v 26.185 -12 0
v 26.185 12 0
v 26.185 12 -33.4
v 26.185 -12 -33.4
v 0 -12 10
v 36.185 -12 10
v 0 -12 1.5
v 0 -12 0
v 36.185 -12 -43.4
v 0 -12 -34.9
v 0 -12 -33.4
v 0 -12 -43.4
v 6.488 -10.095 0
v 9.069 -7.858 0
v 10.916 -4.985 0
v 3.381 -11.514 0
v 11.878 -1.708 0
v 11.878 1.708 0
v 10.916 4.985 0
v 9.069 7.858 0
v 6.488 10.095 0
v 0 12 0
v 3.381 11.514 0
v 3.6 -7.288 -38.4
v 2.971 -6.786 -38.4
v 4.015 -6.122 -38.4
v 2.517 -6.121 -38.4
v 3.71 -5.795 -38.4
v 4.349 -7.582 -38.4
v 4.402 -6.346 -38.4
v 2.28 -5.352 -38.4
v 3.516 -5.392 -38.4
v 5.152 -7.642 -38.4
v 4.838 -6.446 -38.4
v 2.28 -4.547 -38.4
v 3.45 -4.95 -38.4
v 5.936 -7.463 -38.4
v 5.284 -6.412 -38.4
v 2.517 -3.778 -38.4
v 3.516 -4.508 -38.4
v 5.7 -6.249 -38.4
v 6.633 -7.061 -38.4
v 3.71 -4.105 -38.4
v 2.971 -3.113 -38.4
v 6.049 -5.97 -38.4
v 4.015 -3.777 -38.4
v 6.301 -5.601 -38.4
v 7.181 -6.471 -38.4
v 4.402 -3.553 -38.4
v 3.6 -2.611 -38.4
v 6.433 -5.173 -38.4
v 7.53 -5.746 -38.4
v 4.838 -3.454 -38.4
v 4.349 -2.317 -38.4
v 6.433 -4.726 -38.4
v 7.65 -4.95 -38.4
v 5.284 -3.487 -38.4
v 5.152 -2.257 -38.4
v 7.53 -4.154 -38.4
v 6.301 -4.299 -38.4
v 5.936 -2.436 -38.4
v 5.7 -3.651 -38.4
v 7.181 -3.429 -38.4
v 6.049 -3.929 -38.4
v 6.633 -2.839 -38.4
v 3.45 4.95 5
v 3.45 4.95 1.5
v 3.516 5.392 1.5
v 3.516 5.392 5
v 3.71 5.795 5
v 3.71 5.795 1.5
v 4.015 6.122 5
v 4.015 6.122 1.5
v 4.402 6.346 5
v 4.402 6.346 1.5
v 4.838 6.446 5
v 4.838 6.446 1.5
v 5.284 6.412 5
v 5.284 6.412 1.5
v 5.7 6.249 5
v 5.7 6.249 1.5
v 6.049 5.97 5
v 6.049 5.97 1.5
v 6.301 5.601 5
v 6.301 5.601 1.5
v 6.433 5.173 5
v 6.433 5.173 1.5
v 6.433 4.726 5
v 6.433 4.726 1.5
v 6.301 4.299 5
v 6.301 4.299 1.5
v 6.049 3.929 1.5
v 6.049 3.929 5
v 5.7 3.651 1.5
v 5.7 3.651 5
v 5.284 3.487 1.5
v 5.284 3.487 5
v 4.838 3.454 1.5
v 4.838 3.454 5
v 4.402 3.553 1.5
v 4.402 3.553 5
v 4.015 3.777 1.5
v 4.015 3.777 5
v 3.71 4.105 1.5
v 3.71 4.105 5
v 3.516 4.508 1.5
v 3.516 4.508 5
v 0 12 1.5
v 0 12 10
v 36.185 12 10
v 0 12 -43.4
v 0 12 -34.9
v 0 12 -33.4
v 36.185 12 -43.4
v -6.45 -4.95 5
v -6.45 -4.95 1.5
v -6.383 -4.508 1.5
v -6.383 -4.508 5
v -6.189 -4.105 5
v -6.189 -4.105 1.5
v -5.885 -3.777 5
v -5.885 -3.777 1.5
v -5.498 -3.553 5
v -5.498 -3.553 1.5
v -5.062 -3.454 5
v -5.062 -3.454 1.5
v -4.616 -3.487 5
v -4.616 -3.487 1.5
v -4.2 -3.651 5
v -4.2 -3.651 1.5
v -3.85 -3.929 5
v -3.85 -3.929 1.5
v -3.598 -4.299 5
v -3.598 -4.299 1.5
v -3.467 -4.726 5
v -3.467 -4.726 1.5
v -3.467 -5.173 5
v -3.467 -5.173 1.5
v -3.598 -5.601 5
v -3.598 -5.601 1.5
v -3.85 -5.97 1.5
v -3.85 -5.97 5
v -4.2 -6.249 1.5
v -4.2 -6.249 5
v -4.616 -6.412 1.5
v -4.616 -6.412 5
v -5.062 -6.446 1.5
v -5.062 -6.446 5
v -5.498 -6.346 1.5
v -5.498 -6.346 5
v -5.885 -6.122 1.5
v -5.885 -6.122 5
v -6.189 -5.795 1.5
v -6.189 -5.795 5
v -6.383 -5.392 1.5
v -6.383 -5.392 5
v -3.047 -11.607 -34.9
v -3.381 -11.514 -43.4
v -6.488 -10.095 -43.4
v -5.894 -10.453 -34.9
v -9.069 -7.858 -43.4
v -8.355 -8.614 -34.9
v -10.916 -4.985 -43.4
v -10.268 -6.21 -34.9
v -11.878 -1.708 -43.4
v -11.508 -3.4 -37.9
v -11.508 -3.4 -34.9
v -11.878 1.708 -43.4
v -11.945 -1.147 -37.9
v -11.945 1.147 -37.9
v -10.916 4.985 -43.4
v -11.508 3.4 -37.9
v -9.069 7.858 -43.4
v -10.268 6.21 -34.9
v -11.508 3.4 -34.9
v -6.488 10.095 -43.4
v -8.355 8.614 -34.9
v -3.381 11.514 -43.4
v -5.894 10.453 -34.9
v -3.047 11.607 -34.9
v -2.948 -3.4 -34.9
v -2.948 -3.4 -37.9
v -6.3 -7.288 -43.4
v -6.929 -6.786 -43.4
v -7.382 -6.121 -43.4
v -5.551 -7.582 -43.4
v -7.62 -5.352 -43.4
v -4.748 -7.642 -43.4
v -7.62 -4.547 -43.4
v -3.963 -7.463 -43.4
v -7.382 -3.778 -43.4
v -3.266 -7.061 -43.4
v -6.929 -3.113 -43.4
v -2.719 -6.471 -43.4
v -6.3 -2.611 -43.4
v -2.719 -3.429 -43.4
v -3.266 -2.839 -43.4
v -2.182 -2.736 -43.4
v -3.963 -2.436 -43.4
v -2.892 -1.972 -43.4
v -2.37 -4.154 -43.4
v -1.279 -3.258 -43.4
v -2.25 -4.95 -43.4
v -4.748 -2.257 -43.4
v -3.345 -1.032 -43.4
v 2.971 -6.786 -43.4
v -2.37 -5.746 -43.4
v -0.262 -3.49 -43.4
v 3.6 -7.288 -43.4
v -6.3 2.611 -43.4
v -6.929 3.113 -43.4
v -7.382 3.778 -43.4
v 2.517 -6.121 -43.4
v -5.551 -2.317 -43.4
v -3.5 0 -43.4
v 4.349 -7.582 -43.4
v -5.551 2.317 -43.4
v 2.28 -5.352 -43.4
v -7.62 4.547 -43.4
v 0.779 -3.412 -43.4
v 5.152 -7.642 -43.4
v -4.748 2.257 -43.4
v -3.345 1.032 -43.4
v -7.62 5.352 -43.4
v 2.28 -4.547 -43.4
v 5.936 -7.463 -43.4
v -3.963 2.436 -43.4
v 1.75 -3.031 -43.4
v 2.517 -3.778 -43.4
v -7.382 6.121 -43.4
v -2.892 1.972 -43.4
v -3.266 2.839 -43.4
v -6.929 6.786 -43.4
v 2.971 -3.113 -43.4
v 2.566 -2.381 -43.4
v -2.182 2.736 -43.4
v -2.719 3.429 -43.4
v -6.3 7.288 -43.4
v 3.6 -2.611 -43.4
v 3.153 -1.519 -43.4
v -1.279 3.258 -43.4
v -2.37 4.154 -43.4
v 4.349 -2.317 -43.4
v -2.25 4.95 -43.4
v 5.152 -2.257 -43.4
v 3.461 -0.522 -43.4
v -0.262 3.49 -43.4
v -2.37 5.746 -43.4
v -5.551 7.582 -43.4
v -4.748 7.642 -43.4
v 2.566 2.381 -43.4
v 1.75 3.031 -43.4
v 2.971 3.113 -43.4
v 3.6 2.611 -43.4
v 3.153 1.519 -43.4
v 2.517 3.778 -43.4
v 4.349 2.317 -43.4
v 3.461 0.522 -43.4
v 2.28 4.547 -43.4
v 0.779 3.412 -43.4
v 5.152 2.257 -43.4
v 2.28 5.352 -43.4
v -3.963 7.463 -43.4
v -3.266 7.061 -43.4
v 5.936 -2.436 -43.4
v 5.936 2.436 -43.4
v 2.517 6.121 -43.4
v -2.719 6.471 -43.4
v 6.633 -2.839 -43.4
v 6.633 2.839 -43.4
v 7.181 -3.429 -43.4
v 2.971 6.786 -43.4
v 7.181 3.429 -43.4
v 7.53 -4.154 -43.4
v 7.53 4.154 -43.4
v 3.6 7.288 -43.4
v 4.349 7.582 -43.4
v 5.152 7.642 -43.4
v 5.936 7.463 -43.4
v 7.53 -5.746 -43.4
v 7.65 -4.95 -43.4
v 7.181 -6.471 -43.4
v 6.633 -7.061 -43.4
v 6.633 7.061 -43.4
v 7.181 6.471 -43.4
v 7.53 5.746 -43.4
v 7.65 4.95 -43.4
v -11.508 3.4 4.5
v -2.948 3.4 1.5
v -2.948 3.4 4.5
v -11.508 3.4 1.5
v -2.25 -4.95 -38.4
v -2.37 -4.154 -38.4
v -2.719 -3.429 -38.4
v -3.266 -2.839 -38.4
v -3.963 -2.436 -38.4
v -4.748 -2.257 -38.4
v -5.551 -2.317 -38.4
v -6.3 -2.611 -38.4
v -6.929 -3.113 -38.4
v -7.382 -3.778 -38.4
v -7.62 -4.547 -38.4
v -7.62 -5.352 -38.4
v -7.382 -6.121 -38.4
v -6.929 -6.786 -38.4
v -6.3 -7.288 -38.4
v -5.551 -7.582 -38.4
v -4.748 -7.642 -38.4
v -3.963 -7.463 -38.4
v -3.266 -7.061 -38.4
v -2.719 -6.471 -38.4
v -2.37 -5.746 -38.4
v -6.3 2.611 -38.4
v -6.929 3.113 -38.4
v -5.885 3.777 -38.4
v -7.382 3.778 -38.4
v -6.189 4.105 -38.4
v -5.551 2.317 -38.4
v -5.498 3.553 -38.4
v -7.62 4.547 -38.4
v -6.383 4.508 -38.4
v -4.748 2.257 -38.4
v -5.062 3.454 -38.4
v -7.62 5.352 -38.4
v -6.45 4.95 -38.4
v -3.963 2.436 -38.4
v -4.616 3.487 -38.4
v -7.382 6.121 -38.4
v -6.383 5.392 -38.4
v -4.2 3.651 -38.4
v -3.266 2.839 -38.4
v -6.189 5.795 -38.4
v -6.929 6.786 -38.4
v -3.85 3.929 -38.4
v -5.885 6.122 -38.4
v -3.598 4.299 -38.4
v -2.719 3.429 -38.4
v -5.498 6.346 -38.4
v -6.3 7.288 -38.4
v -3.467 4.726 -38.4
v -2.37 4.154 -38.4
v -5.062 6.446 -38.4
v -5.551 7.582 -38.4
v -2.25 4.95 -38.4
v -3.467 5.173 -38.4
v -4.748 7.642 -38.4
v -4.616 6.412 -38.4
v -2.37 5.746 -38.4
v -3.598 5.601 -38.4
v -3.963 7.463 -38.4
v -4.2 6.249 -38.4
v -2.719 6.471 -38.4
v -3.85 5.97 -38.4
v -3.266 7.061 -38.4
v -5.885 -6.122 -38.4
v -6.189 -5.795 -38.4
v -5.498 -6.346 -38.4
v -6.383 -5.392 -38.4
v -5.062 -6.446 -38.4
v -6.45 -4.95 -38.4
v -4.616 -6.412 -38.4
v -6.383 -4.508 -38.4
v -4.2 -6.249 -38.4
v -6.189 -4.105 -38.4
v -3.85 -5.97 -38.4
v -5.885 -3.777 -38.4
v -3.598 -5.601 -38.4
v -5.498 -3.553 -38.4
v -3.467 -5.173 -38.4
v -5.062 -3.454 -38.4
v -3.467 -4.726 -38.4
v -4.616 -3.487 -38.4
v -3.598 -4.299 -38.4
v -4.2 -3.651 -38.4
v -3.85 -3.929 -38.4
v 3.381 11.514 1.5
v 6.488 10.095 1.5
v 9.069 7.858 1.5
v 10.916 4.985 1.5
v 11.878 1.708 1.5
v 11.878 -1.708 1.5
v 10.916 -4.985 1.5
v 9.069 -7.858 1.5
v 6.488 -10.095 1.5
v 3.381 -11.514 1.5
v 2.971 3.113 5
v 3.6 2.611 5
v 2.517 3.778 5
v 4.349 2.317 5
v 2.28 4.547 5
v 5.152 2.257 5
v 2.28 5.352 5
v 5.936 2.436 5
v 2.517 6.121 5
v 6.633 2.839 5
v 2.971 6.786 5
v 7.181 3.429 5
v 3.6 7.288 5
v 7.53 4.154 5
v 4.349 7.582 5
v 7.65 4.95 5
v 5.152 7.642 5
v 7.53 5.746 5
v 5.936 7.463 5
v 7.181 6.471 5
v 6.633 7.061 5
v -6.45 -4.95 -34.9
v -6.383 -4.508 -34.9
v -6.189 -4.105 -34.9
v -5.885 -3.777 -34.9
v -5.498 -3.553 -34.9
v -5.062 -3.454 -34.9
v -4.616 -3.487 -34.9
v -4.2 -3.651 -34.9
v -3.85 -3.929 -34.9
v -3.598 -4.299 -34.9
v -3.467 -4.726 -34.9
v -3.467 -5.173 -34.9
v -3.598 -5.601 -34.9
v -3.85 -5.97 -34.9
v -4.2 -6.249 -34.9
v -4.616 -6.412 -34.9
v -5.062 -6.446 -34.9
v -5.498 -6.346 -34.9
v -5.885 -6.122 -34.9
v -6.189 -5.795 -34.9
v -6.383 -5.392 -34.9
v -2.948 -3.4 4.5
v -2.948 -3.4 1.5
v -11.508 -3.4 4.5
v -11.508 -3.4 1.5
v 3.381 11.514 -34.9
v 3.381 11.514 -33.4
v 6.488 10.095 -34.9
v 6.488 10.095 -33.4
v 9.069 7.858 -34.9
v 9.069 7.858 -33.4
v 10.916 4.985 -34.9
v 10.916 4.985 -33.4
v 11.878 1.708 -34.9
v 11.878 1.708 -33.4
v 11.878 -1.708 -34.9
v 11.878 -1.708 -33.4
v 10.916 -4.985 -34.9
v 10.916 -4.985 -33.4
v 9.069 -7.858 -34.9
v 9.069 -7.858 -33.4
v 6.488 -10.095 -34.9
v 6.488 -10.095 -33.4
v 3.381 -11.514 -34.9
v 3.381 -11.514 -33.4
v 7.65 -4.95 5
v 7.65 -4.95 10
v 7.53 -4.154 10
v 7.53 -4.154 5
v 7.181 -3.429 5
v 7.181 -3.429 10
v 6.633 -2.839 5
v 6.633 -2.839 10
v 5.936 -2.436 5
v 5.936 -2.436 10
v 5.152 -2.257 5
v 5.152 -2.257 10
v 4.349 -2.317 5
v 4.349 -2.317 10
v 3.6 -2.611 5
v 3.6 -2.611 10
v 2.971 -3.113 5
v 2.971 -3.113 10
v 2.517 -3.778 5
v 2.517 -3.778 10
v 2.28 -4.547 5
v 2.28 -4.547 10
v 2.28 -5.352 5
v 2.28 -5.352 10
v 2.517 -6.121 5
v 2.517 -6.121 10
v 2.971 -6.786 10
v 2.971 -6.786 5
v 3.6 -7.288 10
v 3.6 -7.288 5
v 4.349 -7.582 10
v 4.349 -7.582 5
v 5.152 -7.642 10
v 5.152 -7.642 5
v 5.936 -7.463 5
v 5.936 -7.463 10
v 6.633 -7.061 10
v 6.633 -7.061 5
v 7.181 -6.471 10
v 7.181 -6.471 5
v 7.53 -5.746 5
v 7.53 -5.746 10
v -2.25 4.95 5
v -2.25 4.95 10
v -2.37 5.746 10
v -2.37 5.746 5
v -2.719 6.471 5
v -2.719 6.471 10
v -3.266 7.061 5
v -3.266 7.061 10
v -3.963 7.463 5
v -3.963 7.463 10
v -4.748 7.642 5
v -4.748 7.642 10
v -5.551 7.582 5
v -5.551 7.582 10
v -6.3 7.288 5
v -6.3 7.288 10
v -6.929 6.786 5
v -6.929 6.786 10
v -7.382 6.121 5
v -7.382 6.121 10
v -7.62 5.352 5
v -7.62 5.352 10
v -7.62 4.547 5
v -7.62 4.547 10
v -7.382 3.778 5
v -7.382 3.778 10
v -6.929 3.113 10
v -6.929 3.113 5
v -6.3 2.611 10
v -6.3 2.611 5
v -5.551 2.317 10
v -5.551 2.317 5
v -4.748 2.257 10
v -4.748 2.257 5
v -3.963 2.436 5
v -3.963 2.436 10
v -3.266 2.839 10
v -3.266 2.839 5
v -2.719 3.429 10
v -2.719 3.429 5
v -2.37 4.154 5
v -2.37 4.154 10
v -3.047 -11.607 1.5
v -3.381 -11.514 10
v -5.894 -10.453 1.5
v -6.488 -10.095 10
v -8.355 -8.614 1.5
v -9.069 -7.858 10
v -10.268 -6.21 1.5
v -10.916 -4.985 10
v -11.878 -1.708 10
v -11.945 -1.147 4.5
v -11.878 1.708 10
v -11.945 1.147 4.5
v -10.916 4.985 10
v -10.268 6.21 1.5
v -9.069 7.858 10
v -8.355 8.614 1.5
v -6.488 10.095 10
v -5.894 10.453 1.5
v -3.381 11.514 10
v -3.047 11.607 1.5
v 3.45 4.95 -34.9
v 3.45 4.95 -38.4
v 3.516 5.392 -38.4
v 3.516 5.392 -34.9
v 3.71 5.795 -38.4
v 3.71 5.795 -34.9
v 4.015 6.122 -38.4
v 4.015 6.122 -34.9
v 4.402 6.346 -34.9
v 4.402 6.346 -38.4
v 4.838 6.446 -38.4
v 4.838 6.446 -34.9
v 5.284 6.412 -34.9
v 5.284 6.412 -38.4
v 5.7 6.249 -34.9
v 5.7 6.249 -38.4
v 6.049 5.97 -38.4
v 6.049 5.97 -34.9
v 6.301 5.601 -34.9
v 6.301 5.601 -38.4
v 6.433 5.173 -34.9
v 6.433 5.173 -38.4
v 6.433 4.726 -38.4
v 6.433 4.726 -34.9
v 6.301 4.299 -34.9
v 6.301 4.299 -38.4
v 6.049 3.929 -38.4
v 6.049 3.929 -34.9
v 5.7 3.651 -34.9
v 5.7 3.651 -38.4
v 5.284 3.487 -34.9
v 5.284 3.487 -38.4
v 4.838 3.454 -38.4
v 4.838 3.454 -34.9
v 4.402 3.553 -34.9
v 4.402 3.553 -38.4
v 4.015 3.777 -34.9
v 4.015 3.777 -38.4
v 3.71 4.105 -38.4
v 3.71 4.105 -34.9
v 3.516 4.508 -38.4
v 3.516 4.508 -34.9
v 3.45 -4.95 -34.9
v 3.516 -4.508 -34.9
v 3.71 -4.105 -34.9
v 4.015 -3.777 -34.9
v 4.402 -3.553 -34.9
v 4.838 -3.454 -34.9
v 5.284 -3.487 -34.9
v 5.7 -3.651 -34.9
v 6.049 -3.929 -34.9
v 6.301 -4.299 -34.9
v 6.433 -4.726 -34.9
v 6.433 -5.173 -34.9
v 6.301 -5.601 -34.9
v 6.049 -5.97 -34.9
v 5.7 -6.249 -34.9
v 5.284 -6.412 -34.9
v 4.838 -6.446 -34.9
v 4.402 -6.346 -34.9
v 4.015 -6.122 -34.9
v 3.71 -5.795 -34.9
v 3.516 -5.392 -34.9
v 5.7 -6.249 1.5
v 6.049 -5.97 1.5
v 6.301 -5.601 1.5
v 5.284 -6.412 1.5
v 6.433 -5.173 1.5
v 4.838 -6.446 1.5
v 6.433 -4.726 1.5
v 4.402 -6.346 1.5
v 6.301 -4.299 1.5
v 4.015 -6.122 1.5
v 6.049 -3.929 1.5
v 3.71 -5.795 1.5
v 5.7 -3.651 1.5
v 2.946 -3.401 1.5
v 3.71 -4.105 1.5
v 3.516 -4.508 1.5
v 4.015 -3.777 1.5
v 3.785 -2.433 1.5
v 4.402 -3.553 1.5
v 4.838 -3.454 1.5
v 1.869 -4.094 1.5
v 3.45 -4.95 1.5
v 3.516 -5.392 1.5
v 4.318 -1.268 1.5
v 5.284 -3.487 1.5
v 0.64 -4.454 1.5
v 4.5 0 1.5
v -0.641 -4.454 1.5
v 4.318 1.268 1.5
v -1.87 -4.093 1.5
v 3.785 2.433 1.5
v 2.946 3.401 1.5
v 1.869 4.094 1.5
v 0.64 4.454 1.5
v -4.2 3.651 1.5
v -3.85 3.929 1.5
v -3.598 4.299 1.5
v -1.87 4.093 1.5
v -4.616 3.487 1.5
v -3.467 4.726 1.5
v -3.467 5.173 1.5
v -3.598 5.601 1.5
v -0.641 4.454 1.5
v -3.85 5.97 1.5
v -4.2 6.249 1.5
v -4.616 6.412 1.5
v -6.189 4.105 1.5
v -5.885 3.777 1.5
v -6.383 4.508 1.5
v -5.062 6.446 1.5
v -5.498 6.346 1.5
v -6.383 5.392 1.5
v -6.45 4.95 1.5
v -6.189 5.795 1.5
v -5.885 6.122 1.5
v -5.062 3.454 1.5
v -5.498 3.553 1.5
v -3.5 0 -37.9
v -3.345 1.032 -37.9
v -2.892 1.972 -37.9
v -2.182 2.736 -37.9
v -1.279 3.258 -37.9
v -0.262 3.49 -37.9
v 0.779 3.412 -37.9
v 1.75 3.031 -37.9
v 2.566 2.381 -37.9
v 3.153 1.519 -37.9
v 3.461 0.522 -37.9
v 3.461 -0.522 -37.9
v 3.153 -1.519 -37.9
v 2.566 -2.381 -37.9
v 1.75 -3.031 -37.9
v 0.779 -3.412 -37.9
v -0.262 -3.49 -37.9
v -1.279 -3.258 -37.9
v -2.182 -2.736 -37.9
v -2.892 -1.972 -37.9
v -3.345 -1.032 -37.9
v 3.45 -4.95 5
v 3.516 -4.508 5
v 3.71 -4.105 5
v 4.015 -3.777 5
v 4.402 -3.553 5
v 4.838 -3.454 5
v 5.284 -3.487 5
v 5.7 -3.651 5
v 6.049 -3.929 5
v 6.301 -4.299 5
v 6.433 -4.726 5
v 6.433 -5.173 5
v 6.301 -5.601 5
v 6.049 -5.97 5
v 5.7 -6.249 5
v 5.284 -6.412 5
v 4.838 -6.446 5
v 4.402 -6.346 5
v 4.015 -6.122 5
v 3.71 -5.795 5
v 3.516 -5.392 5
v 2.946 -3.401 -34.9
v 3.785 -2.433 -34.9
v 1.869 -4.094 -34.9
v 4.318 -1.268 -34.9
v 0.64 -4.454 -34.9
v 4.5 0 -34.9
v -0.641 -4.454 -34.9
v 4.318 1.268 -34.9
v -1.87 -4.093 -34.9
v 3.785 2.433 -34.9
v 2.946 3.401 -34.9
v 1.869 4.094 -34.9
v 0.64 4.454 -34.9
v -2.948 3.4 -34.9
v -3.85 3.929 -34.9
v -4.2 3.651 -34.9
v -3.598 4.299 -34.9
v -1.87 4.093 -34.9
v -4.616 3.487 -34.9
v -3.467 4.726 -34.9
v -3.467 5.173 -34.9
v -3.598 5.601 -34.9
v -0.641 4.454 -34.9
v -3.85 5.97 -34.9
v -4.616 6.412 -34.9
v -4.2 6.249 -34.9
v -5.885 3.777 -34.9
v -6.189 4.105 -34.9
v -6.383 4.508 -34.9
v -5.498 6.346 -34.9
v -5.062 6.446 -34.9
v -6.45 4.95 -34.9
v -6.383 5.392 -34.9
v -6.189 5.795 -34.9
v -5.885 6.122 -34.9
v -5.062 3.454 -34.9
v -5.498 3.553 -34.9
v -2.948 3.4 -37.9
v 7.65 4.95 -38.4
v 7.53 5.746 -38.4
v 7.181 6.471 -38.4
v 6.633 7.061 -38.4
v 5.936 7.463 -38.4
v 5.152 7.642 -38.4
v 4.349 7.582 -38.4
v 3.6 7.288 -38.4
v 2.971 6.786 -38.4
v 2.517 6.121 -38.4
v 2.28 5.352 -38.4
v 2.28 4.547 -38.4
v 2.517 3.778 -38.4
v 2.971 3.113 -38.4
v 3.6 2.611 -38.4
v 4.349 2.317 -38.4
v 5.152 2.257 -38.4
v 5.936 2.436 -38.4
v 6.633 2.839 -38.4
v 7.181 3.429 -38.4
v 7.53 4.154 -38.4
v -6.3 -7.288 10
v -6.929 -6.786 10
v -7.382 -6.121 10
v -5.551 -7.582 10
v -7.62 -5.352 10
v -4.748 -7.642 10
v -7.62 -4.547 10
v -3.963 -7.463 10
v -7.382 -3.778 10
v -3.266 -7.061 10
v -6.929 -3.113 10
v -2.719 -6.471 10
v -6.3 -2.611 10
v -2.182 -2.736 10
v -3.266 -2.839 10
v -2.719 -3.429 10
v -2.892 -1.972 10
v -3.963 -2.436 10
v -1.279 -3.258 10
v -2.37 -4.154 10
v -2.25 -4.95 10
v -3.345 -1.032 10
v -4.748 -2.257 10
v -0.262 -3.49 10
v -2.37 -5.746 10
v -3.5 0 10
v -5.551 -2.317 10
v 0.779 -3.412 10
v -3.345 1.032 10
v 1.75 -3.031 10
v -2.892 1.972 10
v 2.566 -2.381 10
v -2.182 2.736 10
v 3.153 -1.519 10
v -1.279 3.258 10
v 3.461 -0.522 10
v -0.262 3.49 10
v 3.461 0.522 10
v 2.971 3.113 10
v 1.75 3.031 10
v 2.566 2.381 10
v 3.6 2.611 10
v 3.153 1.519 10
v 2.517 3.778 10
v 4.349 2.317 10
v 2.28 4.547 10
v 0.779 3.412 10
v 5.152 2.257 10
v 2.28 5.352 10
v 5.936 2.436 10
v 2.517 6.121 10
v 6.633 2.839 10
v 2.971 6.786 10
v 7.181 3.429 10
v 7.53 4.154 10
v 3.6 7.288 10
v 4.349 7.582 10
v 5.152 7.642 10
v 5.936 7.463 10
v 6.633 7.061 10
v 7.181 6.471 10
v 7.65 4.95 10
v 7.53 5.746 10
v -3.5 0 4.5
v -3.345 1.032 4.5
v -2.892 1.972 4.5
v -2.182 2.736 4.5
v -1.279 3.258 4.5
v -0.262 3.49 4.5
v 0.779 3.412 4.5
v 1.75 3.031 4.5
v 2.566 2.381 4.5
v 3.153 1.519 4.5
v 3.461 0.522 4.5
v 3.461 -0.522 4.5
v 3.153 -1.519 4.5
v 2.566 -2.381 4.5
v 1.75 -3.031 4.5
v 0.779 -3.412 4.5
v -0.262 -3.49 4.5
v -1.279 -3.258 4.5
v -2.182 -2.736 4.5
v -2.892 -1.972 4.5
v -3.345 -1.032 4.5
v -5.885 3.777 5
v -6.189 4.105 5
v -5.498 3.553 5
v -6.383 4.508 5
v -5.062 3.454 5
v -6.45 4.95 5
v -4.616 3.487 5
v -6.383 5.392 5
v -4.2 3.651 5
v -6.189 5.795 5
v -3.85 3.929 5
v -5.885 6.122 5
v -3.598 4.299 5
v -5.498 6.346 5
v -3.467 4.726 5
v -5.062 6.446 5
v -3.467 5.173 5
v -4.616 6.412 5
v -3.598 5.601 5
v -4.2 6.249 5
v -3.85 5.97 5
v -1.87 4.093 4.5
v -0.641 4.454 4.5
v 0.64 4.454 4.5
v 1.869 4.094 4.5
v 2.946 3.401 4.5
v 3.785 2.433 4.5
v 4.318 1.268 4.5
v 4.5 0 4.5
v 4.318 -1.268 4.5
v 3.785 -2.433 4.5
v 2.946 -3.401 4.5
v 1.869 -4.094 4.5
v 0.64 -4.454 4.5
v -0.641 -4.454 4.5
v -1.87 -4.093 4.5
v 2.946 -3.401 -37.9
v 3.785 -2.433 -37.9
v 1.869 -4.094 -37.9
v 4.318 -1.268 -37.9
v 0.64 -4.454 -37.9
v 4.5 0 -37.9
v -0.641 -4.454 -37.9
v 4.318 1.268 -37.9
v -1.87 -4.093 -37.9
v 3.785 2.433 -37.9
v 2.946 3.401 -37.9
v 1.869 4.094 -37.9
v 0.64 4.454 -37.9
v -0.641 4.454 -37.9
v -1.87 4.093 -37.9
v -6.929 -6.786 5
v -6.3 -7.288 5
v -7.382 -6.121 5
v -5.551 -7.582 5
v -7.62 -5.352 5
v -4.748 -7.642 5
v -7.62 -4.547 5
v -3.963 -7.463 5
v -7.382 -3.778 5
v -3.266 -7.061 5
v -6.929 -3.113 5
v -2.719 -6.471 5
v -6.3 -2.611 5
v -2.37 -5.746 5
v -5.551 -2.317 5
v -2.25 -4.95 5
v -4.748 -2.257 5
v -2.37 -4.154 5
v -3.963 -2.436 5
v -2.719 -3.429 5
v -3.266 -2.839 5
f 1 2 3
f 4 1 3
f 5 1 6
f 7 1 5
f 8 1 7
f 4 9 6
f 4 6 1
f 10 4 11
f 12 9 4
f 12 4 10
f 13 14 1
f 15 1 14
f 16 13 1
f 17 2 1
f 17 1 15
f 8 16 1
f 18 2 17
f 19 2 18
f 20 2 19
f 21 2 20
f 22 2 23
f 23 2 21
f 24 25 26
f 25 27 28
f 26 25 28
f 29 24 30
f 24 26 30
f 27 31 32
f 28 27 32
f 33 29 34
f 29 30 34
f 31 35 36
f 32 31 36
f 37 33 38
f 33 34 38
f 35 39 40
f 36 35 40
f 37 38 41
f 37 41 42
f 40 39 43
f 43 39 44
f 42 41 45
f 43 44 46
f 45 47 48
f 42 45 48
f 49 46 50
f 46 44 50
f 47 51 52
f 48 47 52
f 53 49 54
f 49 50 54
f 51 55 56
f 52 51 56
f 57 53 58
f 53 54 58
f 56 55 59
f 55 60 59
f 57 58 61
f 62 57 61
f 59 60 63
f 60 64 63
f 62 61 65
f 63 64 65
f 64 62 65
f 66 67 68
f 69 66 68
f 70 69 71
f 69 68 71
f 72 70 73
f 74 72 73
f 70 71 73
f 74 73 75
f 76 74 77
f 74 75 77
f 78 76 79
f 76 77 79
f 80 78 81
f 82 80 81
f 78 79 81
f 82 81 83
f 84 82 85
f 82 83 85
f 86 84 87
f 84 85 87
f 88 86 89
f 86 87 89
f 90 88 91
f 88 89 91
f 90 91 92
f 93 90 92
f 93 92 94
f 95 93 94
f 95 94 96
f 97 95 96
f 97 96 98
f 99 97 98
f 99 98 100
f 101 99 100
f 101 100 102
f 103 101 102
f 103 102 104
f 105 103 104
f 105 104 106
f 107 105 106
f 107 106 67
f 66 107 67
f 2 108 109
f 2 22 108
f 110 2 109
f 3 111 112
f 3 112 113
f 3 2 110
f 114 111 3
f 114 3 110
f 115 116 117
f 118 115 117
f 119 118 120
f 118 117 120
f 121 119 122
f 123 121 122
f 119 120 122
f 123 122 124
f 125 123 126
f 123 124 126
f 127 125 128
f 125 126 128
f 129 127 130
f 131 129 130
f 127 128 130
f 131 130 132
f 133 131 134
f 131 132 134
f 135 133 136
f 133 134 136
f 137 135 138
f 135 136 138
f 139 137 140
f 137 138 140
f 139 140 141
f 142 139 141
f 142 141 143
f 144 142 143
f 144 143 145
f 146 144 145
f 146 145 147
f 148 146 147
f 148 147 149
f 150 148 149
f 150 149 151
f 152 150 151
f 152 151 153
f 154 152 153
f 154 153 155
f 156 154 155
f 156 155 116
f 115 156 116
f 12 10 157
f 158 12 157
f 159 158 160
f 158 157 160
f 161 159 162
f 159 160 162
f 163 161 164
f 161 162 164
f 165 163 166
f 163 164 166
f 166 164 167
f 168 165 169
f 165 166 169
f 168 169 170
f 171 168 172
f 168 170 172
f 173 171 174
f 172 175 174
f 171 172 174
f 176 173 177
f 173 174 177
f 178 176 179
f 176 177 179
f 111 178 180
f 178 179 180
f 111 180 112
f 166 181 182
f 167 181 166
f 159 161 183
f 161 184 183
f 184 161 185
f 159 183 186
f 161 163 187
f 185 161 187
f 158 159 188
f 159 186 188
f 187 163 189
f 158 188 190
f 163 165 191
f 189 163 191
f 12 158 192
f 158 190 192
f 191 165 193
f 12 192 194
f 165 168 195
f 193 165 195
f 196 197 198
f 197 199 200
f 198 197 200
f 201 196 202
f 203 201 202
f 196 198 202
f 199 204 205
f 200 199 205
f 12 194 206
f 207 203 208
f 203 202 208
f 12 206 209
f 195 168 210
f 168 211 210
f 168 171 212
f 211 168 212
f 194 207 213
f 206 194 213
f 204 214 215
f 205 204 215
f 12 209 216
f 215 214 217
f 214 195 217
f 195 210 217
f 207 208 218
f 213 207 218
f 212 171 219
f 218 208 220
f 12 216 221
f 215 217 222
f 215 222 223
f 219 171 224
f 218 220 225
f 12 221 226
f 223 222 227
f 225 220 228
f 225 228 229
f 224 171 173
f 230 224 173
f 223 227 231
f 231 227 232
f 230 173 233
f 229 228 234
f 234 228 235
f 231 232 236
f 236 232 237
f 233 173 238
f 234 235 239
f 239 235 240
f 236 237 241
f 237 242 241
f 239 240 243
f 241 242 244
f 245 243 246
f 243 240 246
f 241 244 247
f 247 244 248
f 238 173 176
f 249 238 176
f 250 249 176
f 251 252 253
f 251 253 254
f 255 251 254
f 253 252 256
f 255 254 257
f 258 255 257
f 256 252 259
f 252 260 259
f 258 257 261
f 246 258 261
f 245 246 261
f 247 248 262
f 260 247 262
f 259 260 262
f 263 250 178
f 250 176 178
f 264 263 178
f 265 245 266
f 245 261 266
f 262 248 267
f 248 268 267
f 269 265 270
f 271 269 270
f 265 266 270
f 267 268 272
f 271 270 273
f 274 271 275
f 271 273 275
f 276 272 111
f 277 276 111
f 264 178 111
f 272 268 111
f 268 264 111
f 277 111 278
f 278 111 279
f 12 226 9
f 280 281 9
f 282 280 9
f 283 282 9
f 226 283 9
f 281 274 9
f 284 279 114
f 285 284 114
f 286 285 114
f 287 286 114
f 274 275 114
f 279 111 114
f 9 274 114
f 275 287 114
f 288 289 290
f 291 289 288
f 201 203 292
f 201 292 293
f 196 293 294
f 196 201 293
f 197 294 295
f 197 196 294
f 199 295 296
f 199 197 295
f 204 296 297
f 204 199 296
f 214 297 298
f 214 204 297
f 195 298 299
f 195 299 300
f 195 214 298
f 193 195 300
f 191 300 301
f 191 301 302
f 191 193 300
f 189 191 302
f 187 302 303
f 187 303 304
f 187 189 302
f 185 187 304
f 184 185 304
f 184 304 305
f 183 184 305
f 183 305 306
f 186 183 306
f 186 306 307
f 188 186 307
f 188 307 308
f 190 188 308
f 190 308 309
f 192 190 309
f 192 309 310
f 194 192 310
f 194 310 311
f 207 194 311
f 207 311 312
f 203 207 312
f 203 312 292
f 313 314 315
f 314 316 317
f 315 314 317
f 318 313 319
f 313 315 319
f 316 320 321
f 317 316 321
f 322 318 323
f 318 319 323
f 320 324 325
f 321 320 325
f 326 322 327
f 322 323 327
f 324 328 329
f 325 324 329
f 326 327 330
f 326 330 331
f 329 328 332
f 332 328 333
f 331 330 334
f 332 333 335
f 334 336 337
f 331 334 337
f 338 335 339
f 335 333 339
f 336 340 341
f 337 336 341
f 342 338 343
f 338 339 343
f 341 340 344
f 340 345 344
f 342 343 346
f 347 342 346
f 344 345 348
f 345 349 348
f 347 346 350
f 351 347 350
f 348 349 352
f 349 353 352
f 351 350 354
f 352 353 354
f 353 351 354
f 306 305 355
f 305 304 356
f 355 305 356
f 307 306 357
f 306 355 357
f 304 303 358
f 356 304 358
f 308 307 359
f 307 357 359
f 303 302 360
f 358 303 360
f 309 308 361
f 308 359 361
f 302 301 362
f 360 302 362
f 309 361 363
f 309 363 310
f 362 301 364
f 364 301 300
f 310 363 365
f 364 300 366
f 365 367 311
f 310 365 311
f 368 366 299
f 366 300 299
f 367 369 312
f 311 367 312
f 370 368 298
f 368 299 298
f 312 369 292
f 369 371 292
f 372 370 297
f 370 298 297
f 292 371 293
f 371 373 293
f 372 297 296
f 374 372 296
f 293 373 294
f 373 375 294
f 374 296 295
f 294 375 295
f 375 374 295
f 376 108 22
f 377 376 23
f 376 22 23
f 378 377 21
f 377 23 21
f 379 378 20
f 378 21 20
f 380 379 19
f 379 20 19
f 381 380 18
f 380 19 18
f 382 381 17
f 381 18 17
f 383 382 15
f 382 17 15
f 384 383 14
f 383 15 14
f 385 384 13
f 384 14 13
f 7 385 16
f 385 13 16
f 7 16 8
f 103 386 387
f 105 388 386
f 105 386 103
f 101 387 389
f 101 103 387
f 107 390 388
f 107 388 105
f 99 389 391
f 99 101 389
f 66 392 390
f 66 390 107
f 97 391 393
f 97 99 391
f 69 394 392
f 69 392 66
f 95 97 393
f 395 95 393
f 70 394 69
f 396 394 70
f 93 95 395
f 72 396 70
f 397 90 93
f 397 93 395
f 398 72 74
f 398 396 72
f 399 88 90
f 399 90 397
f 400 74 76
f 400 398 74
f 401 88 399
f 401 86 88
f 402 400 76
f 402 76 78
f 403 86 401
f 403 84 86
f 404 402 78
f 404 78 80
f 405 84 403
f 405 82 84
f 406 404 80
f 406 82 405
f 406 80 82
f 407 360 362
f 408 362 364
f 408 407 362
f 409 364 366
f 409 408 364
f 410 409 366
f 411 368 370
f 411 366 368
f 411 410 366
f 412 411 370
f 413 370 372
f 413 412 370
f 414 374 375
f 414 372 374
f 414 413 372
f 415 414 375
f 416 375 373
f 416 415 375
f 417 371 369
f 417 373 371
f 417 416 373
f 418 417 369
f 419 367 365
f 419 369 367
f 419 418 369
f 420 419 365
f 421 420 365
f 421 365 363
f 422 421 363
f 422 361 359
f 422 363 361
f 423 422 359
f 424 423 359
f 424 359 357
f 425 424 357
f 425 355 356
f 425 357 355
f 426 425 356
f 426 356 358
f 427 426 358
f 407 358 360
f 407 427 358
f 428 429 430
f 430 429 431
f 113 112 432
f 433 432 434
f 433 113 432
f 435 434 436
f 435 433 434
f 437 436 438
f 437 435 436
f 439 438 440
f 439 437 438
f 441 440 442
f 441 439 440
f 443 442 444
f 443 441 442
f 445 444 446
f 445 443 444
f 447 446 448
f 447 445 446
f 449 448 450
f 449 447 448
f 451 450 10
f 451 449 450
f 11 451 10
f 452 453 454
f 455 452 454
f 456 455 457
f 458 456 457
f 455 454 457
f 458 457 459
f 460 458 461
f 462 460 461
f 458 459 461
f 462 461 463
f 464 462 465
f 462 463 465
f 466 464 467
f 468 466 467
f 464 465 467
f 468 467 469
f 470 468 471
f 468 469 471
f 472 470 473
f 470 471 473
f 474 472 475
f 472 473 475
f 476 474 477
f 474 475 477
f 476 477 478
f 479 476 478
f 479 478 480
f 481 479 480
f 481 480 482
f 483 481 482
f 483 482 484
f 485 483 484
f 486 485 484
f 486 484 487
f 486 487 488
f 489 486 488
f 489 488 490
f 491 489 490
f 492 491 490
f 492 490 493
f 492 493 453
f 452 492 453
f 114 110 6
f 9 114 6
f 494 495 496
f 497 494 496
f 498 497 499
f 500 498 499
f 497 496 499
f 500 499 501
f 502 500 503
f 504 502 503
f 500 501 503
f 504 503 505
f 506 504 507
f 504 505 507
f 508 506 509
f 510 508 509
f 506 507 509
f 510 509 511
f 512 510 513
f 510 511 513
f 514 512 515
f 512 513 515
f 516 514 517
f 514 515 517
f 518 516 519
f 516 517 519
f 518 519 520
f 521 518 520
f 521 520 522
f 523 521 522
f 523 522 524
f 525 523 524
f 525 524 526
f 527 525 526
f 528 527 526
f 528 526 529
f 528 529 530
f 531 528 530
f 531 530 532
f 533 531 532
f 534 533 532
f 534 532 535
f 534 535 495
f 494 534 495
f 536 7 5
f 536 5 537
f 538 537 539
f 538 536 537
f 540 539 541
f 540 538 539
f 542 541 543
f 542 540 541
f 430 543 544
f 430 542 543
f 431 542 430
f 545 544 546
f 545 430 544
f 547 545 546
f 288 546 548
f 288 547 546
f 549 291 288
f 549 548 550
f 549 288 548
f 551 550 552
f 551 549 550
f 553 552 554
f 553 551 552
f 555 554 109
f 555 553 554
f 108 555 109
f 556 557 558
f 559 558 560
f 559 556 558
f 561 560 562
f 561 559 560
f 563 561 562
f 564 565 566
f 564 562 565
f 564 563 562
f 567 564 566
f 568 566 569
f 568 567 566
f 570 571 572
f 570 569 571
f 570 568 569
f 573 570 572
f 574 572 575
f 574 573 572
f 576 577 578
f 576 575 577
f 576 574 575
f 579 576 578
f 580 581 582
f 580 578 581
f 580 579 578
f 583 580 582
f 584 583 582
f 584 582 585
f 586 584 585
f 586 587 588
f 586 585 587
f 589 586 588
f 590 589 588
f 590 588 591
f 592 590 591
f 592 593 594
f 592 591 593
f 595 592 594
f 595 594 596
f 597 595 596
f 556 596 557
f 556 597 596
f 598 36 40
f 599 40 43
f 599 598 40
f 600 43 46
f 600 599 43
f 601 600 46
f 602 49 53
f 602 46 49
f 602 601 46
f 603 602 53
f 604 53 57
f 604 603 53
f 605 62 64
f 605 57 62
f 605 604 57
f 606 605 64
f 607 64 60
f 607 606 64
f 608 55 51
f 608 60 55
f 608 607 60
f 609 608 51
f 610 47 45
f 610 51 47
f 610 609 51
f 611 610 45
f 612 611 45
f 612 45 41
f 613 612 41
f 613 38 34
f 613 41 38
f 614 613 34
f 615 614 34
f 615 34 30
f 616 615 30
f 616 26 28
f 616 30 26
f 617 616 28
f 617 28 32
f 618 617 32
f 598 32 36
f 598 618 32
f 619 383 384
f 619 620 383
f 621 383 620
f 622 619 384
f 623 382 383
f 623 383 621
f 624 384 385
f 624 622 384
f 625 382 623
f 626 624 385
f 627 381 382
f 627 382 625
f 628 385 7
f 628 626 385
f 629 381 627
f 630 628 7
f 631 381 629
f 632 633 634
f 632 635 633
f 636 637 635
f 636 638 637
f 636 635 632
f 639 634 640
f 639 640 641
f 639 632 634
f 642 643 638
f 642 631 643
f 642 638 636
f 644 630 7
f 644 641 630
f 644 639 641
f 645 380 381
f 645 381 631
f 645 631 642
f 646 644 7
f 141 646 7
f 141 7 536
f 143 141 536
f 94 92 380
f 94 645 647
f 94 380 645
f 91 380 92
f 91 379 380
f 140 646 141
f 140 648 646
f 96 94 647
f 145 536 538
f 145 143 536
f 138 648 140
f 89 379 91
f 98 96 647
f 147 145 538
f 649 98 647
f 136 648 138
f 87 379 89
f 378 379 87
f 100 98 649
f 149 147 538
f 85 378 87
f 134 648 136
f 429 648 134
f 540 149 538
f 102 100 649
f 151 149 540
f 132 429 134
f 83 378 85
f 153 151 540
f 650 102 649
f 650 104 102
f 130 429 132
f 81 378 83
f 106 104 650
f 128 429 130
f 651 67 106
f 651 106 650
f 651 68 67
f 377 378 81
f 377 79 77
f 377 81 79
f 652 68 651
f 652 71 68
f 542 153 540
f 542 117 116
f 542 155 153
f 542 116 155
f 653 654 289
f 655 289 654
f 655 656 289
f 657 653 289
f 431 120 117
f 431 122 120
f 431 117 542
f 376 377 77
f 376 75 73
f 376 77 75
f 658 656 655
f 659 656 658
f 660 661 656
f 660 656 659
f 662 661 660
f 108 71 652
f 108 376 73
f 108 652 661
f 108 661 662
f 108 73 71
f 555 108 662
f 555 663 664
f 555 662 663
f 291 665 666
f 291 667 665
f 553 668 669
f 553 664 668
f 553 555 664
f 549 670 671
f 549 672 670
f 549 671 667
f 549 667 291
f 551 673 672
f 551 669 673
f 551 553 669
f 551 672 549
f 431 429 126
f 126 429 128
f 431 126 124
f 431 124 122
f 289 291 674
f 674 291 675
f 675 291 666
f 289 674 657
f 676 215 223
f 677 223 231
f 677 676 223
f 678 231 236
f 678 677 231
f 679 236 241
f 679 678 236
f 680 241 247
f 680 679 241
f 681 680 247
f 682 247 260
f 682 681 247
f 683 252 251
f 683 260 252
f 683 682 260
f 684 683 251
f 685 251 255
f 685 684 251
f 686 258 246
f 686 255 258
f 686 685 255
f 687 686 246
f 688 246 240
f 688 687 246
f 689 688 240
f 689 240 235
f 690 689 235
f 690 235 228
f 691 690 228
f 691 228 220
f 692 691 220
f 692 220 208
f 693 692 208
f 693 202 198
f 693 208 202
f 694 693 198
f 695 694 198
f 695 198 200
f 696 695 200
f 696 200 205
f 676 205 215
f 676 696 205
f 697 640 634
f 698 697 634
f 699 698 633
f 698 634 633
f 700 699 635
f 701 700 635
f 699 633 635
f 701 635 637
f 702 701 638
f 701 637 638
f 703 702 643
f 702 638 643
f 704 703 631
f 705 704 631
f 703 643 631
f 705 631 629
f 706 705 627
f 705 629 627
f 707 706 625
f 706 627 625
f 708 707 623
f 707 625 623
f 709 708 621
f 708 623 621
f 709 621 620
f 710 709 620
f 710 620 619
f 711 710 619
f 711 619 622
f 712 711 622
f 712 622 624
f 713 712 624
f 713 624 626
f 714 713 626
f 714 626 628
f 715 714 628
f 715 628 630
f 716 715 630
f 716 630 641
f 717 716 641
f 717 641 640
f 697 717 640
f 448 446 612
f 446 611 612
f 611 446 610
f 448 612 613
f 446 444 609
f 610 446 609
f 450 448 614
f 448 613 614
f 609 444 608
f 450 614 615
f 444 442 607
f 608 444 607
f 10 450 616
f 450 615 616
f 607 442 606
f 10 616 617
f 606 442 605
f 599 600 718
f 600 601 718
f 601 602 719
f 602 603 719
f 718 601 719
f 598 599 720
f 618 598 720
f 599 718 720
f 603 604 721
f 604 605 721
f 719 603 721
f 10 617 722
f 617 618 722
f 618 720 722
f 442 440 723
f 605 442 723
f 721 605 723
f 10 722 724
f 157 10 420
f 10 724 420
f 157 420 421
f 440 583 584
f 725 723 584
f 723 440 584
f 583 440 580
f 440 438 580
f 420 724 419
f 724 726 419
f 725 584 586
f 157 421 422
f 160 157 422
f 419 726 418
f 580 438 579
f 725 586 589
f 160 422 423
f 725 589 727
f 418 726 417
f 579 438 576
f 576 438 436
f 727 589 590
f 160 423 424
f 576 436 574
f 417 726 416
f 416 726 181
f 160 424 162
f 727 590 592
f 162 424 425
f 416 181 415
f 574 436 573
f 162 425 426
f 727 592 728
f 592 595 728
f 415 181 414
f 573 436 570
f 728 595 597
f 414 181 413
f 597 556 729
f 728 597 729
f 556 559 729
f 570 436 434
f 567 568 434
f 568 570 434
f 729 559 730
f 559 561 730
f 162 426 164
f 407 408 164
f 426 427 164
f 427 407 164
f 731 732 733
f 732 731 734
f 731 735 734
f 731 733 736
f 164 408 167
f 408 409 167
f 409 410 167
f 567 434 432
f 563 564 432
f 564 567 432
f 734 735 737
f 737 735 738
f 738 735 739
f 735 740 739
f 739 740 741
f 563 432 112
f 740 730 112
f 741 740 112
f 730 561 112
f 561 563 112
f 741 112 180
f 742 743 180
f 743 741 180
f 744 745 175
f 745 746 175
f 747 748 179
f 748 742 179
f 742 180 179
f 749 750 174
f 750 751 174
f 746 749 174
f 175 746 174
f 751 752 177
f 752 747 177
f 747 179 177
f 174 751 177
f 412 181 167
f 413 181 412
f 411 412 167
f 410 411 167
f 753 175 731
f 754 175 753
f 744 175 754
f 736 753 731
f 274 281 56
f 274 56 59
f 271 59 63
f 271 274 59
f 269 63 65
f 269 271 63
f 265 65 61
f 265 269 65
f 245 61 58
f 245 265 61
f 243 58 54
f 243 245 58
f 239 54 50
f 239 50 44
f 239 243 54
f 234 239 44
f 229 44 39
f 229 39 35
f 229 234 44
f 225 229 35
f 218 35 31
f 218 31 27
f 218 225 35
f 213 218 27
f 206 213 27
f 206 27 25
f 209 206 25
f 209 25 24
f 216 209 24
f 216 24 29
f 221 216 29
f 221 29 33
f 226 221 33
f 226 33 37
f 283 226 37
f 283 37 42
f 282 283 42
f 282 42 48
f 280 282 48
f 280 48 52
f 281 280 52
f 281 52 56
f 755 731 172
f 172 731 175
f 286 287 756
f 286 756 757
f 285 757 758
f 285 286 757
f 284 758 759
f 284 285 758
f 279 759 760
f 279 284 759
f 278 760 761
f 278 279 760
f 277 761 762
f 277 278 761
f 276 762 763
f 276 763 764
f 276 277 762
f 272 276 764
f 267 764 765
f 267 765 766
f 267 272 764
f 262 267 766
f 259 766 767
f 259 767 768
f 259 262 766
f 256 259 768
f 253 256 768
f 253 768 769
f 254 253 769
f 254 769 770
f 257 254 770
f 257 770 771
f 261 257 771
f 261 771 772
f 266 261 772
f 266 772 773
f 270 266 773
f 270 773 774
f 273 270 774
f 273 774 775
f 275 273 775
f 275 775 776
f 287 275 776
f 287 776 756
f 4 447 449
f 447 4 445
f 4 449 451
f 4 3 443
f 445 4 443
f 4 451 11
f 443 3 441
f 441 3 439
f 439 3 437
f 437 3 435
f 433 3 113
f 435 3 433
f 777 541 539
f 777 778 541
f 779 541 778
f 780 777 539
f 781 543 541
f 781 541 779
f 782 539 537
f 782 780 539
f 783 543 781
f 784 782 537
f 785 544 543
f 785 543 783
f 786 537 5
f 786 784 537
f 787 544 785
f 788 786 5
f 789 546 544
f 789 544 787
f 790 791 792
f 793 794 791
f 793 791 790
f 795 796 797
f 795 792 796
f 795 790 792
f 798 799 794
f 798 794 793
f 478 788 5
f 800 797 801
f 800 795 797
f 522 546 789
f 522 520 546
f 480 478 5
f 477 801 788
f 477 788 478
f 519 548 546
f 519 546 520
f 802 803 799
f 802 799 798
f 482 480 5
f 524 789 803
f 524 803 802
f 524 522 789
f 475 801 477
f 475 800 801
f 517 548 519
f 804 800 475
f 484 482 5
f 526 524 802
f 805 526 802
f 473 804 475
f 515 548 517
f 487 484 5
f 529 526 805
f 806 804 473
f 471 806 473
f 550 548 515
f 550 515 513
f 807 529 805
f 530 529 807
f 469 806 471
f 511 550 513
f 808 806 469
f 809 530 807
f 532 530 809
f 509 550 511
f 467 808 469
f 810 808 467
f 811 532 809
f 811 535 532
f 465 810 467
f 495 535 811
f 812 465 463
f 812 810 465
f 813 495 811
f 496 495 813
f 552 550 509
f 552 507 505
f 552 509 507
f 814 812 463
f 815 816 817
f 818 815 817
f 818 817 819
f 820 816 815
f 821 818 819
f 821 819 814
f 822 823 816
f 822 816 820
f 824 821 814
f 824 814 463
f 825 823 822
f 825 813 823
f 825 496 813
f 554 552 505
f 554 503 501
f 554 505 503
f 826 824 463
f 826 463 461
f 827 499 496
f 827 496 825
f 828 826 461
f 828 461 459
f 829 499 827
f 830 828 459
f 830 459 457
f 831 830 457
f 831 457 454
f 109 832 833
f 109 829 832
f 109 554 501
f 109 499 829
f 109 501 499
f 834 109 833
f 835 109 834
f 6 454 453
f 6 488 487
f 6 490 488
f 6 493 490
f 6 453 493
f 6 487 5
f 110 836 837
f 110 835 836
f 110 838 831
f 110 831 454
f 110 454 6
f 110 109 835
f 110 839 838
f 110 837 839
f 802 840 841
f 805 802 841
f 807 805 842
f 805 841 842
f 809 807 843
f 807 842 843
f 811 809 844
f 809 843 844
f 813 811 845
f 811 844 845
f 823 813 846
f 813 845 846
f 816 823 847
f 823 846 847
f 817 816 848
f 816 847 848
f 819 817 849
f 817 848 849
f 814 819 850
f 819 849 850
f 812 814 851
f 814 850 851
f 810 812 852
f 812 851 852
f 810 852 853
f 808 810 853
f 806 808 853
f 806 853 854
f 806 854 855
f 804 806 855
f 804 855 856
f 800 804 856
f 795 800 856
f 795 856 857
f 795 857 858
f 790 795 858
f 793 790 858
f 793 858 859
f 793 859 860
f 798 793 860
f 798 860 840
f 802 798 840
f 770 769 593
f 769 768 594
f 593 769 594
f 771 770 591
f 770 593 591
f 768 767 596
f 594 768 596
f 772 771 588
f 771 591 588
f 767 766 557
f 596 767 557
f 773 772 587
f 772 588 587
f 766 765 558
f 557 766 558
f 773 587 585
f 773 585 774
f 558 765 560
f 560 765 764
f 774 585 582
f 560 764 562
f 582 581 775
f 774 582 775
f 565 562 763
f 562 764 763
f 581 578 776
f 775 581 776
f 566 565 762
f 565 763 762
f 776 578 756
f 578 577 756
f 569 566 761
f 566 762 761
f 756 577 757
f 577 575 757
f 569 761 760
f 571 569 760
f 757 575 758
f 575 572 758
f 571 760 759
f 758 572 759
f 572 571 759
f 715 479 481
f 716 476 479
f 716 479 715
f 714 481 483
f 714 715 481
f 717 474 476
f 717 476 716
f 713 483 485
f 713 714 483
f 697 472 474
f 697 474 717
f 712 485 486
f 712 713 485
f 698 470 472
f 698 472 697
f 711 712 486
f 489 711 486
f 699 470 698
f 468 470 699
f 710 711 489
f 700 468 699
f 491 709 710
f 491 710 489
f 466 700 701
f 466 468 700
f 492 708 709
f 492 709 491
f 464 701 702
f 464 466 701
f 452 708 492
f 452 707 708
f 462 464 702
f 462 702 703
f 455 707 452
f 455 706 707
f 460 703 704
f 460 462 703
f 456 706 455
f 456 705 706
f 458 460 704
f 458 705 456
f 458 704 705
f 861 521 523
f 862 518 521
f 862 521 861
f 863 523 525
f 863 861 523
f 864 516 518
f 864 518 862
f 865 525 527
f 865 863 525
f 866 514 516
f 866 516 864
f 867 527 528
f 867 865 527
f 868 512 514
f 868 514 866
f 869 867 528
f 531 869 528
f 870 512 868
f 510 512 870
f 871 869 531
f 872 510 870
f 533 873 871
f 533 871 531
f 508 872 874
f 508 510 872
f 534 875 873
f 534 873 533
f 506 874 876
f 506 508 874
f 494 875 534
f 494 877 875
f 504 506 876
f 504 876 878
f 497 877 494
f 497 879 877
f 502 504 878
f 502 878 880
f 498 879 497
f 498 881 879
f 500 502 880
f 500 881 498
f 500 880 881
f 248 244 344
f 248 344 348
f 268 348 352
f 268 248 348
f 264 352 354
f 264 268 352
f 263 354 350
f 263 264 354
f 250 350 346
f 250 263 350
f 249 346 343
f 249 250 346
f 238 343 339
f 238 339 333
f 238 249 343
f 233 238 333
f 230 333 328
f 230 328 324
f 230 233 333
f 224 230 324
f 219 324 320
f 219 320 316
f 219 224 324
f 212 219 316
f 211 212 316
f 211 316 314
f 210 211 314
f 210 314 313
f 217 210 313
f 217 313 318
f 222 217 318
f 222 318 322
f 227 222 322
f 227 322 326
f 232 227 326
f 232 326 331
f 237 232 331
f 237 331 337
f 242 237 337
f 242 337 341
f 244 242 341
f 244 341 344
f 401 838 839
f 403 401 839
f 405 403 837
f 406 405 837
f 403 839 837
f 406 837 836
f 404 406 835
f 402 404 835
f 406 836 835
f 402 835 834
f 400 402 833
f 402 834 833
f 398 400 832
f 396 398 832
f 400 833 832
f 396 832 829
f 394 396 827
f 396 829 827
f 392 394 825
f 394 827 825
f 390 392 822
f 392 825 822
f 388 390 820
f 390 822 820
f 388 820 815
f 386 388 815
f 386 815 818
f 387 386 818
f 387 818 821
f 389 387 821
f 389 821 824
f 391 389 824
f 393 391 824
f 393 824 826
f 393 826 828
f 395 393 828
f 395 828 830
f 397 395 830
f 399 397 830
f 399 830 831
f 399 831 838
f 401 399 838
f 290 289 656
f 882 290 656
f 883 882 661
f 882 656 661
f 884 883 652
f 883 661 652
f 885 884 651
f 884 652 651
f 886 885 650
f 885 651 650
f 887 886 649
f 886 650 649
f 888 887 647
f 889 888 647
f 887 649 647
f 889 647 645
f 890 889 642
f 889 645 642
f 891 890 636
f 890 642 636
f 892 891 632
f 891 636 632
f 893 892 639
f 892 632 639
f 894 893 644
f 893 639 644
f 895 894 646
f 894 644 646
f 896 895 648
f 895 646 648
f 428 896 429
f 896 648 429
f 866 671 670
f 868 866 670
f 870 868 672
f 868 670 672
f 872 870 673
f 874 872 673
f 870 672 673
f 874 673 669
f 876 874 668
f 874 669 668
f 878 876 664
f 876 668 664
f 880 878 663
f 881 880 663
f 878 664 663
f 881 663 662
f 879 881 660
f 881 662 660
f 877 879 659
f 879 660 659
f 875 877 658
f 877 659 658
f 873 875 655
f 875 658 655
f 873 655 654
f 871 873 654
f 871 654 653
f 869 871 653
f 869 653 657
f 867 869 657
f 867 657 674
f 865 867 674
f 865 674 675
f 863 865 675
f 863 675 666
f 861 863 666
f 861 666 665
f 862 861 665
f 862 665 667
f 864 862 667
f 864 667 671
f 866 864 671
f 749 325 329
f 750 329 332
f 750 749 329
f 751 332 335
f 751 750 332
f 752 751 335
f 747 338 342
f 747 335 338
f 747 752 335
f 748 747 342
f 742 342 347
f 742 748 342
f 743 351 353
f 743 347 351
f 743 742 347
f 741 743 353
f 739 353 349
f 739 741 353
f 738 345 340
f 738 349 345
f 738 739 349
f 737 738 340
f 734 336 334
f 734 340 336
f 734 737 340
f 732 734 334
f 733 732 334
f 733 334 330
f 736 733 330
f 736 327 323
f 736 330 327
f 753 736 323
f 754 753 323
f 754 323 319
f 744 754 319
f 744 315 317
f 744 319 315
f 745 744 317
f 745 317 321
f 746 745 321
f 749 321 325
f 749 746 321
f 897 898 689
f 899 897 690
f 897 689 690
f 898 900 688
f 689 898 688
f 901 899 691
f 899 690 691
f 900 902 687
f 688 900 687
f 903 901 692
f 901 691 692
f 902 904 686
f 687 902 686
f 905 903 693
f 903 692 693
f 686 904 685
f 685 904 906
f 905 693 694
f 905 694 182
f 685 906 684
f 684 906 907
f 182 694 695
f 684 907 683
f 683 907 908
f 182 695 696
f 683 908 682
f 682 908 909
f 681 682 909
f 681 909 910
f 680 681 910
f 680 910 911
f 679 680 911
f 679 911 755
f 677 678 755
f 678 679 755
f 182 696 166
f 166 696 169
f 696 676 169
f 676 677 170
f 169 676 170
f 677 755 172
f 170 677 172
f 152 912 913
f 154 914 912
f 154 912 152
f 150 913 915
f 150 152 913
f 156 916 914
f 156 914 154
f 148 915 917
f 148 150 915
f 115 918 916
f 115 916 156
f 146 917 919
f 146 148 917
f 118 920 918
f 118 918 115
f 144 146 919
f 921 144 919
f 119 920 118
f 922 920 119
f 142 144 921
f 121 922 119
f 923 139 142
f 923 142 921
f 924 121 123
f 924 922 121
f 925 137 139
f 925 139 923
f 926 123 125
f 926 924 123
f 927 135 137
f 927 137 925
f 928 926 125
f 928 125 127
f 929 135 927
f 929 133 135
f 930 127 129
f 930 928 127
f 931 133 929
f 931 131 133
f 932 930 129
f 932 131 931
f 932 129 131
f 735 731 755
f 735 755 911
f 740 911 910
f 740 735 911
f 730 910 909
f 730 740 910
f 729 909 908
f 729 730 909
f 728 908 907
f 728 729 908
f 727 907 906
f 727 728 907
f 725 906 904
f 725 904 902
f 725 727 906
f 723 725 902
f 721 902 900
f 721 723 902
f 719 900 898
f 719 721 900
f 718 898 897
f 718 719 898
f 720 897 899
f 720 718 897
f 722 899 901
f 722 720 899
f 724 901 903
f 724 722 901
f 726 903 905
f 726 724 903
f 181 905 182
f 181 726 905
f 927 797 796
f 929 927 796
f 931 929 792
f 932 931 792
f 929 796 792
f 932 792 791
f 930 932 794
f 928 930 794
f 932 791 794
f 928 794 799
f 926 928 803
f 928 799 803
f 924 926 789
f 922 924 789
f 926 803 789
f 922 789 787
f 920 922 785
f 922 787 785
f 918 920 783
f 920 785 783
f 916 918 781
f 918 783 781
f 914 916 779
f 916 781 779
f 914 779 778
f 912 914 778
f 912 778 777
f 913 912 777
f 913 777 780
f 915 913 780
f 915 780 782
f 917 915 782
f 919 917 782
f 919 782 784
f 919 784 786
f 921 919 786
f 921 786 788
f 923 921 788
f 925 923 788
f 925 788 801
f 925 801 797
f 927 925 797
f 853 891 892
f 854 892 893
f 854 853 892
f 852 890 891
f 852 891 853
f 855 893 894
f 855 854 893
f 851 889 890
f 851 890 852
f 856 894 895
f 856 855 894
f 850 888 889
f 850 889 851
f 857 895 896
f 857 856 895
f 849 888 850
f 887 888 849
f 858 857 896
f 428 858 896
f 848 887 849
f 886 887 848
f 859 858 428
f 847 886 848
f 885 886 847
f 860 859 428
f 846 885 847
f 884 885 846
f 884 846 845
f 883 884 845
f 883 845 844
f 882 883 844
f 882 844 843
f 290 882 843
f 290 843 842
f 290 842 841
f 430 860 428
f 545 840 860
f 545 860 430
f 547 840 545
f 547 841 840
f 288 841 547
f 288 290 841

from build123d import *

# Parameters (mm, degrees)
EXTRUDE_1_DEPTH      = 13.5
SKETCH_5_R           = 10.1
CUT_EXTRUDE_2_DEPTH  = 1.5
SKETCH_7_R           = 3.5
CUT_EXTRUDE_3_DEPTH  = 37
SKETCH_21_R          = 4.5
CUT_EXTRUDE_12_DEPTH = 3
SKETCH_9_R           = 1.5
CUT_EXTRUDE_4_DEPTH  = 24.5
SKETCH_11_W          = 60.4
SKETCH_11_H          = 24
EXTRUDE_2_DEPTH      = 10
SKETCH_12_R          = 2.7
CUT_EXTRUDE_5_DEPTH  = 8.5
SKETCH_18_R          = 12
CUT_EXTRUDE_9_DEPTH  = 1.5
SKETCH_19_W          = 16.628747166
SKETCH_19_H          = 6.8
CUT_EXTRUDE_10_DEPTH = 3
SKETCH_20_W          = 76.507524202
SKETCH_20_H          = 37.102074034
CUT_EXTRUDE_11_DEPTH = 3.5


with BuildPart() as part:
    # 草图1 → 凸台-拉伸1 (new body)
    with BuildSketch(Plane.XY):
        with BuildLine():
            Line((0, 12), (36.185307738, 12))
            Line((36.185307738, 12), (36.185307738, -12))
            Line((36.185307738, -12), (0, -12))
            ThreePointArc((0, -12), (-12, 0), (0, 12))
        make_face()
    extrude(amount=EXTRUDE_1_DEPTH)

    # 草图5 → 切除-拉伸2 (cut)
    with BuildSketch(Plane(origin=(0, 0, 0), x_dir=(-1, 0, 0), z_dir=(0, 0, -1))):
        Circle(SKETCH_5_R)
    extrude(amount=-CUT_EXTRUDE_2_DEPTH, mode=Mode.SUBTRACT)

    # 草图7 → 切除-拉伸3 (cut)
    with BuildSketch(Plane(origin=(0, 0, 1.5), x_dir=(-1, 0, 0), z_dir=(0, 0, -1))):
        Circle(SKETCH_7_R)
    extrude(amount=-CUT_EXTRUDE_3_DEPTH, mode=Mode.SUBTRACT)

    # 草图21 → 切除-拉伸12 (cut)
    with BuildSketch(Plane(origin=(0, 0, 1.5), x_dir=(-1, 0, 0), z_dir=(0, 0, -1))):
        Circle(SKETCH_21_R)
    extrude(amount=-CUT_EXTRUDE_12_DEPTH, mode=Mode.SUBTRACT)

    # 草图9 → 切除-拉伸4 (cut)
    with BuildSketch(Plane(origin=(0, 0, 1.5), x_dir=(-1, 0, 0), z_dir=(0, 0, -1))):
        with Locations((-4.949747468, 4.949747468)):
            Circle(SKETCH_9_R)
        with Locations((4.949747468, 4.949747468)):
            Circle(SKETCH_9_R)
        with Locations((4.949747468, -4.949747468)):
            Circle(SKETCH_9_R)
        with Locations((-4.949747468, -4.949747468)):
            Circle(SKETCH_9_R)
    extrude(amount=-CUT_EXTRUDE_4_DEPTH, mode=Mode.SUBTRACT)


with BuildPart() as body_2:
    # 镜向14: mirrored copy
    add(part.part.mirror(Plane(origin=(0, 0, -16.7), x_dir=(1, 0, 0), z_dir=(0, 0, -1))))


with BuildPart() as part_1:
    add(part.part)

    add(body_2.part)  # 凸台-拉伸2 merges body 2
    # 草图11 → 凸台-拉伸2 (add)
    with BuildSketch(Plane(origin=(36.185307738, 0, 0), x_dir=(0, 0, -1), z_dir=(1, 0, 0))):
        with Locations((16.7, 0)):
            Rectangle(SKETCH_11_W, SKETCH_11_H)
    extrude(amount=-EXTRUDE_2_DEPTH)

    # 草图12 → 切除-拉伸5 (cut)
    with BuildSketch(Plane.XY.offset(13.5)):
        with Locations((4.949747468, 4.949747468)):
            Circle(SKETCH_12_R)
        with Locations((4.949747468, -4.949747468)):
            Circle(SKETCH_12_R)
        with Locations((-4.949747468, -4.949747468)):
            Circle(SKETCH_12_R)
        with Locations((-4.949747468, 4.949747468)):
            Circle(SKETCH_12_R)
    cut_extrude_5 = extrude(amount=-CUT_EXTRUDE_5_DEPTH, mode=Mode.SUBTRACT)

    # 草图18 → 切除-拉伸9 (cut)
    with BuildSketch(Plane(origin=(0, 0, 0), x_dir=(-1, 0, 0), z_dir=(0, 0, -1))):
        Circle(SKETCH_18_R)
    cut_extrude_9 = extrude(amount=-CUT_EXTRUDE_9_DEPTH, mode=Mode.SUBTRACT)

    # 草图19 → 切除-拉伸10 (cut)
    with BuildSketch(Plane(origin=(0, 0, 1.5), x_dir=(-1, 0, 0), z_dir=(0, 0, -1))):
        with Locations((8.314373583, 0)):
            Rectangle(SKETCH_19_W, SKETCH_19_H)
    cut_extrude_10 = extrude(amount=-CUT_EXTRUDE_10_DEPTH, mode=Mode.SUBTRACT)

    # 草图20 → 切除-拉伸11 (cut)
    with BuildSketch(Plane.XY.offset(13.5)):
        with Locations((20.283666709, 0.248055891)):
            Rectangle(SKETCH_20_W, SKETCH_20_H)
    cut_extrude_11 = extrude(amount=-CUT_EXTRUDE_11_DEPTH, mode=Mode.SUBTRACT)

    # 镜向24: 切除-拉伸5, 切除-拉伸9, 切除-拉伸10 across plane
    add(cut_extrude_5.mirror(Plane(origin=(0, 0, -16.7), x_dir=(1, 0, 0), z_dir=(0, 0, -1))), mode=Mode.SUBTRACT)
    add(cut_extrude_9.mirror(Plane(origin=(0, 0, -16.7), x_dir=(1, 0, 0), z_dir=(0, 0, -1))), mode=Mode.SUBTRACT)
    add(cut_extrude_10.mirror(Plane(origin=(0, 0, -16.7), x_dir=(1, 0, 0), z_dir=(0, 0, -1))), mode=Mode.SUBTRACT)

    # 镜向26: 切除-拉伸11 across plane
    add(cut_extrude_11.mirror(Plane(origin=(0, 0, -16.7), x_dir=(1, 0, 0), z_dir=(0, 0, -1))), mode=Mode.SUBTRACT)


solid = part_1.part
